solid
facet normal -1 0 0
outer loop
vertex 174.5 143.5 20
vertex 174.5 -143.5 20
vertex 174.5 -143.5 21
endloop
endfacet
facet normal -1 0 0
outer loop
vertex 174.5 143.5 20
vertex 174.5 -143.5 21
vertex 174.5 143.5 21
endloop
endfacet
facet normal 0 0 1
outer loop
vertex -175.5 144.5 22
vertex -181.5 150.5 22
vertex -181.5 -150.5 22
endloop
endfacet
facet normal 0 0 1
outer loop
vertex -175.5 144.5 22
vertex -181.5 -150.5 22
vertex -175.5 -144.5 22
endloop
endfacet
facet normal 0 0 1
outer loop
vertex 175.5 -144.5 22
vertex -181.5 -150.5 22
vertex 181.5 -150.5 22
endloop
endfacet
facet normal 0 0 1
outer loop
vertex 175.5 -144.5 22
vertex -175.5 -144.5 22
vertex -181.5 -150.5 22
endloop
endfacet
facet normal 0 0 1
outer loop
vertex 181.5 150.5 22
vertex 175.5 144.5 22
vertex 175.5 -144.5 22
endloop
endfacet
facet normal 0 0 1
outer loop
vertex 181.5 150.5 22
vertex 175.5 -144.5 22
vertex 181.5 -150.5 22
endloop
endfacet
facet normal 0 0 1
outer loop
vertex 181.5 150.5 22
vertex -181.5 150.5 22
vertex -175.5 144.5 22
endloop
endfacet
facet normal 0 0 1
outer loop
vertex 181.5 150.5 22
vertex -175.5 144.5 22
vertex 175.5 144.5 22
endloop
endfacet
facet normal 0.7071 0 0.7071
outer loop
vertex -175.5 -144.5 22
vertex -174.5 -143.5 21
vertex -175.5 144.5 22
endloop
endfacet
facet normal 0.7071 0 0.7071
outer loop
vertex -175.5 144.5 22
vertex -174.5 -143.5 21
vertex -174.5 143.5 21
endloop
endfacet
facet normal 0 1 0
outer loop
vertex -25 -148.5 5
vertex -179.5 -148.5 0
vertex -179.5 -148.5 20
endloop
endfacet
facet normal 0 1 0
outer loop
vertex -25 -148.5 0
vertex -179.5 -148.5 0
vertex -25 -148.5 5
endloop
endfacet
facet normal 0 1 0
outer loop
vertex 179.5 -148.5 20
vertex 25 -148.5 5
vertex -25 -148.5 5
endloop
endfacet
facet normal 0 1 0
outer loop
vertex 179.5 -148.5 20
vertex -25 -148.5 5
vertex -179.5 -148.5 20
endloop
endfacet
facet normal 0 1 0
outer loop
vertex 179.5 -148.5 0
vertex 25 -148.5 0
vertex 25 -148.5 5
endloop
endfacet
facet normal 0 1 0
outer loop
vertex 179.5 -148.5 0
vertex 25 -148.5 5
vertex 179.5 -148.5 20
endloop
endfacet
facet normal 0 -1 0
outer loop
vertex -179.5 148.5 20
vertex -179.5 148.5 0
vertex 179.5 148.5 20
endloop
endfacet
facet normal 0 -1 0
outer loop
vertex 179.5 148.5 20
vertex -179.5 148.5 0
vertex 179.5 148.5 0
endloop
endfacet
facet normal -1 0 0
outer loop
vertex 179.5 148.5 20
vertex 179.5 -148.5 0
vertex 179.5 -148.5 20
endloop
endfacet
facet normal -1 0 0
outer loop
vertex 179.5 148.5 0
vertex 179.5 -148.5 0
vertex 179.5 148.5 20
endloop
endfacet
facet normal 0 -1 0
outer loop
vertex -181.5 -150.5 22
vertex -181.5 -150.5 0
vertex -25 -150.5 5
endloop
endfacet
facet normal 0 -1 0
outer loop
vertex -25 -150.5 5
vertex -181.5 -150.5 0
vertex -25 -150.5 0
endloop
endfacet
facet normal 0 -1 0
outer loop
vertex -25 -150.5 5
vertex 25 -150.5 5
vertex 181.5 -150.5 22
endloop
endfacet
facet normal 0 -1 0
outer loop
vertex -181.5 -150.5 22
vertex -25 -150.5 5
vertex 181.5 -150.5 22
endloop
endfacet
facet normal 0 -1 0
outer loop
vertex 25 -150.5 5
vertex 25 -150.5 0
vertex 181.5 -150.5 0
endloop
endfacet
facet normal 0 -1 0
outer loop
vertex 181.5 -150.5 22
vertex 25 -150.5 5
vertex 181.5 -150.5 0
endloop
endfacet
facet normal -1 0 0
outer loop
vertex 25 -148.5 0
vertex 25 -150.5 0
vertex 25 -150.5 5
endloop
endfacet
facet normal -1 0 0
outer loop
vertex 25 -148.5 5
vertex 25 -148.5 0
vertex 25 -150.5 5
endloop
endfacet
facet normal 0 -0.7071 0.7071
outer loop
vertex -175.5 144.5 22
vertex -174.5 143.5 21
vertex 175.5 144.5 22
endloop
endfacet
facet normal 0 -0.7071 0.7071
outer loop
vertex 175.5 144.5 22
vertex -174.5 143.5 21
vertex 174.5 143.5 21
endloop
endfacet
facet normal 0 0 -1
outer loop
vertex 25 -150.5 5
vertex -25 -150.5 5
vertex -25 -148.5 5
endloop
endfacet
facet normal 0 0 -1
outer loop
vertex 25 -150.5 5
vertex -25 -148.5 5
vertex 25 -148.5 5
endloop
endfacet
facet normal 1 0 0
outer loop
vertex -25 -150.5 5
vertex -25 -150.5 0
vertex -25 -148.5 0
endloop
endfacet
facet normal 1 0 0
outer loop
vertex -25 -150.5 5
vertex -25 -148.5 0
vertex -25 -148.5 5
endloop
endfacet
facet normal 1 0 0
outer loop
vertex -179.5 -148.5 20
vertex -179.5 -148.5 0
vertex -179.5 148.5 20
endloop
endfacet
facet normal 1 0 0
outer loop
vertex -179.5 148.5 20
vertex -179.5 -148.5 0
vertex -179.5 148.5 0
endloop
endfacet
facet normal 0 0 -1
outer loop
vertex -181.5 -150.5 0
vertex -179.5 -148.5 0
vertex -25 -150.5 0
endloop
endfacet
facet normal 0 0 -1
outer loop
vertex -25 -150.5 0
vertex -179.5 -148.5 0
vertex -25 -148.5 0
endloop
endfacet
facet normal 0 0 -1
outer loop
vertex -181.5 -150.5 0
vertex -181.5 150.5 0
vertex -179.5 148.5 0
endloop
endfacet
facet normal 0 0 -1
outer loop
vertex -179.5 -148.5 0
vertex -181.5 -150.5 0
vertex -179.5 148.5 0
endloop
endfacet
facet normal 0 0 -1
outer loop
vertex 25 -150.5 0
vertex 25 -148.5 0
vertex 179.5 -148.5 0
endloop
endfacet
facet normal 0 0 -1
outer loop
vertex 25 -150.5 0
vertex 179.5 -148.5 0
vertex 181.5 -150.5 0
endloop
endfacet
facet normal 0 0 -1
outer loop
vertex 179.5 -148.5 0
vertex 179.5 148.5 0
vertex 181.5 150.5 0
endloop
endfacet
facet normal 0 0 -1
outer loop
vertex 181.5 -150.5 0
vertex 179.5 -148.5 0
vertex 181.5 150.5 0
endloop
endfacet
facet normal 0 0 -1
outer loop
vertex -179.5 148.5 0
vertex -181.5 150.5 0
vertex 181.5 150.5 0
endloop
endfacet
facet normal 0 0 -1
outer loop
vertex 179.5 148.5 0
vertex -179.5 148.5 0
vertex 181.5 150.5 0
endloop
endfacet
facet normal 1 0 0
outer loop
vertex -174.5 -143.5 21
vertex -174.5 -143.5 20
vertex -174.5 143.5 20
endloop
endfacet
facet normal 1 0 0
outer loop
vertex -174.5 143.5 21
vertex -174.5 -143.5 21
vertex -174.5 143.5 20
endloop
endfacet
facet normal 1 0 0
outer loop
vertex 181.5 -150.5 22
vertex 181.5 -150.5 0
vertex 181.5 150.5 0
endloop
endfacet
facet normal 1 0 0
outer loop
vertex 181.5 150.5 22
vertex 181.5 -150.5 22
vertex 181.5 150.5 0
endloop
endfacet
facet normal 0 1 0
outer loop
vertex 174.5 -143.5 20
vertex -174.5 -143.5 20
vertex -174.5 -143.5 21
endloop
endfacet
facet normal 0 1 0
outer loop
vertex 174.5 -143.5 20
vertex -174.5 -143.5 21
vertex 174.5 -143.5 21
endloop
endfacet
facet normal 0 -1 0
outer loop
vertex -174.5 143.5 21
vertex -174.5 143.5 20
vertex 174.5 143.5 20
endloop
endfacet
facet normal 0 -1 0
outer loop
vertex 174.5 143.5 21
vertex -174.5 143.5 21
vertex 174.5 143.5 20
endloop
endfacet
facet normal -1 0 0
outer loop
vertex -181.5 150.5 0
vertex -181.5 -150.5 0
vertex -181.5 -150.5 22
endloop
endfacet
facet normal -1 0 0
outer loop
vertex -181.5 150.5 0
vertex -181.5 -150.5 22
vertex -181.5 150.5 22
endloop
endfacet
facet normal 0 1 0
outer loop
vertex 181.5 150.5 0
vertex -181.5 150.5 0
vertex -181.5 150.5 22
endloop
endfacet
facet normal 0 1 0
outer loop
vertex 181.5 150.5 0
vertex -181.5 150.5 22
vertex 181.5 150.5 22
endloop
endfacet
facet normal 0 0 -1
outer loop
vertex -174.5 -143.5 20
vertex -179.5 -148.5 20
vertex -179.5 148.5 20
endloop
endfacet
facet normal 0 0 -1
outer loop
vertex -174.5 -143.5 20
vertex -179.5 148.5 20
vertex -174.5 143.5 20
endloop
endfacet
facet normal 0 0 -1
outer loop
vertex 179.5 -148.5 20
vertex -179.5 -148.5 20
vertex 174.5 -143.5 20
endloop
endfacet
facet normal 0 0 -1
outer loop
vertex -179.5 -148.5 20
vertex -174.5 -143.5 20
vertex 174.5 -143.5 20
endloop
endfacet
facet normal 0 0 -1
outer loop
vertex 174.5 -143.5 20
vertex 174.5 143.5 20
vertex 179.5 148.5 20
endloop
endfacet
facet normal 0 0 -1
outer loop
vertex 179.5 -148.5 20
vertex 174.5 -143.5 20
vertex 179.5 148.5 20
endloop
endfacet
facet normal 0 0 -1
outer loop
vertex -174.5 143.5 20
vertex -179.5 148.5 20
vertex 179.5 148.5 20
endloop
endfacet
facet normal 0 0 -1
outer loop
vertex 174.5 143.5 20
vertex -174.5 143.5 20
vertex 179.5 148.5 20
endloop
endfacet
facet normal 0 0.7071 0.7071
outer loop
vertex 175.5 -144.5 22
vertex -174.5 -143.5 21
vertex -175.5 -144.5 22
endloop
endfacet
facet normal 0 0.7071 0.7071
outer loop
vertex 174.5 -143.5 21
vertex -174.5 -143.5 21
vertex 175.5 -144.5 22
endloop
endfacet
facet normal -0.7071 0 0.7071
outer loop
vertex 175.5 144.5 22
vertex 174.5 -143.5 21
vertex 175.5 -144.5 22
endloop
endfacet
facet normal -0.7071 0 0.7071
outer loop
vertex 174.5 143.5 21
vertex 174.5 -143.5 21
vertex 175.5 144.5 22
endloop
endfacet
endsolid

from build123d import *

# Parameters (mm, degrees)
F0_W     = 363
F0_H     = 301
F0_W_2   = 359
F0_H_2   = 297
F0_W_3   = 349
F0_H_3   = 287
F1_DEPTH = 22
F2_DEPTH = 25
F3_DEPTH = 20
F4_SIZE  = 1
F5_W     = 50
F5_H     = 5
F6_DEPTH = 25


with BuildPart() as f1:
    # F0 (on Top) → F1 (new body)
    with BuildSketch(Plane.XY):
        Rectangle(F0_W, F0_H)
        Rectangle(F0_W_2, F0_H_2, mode=Mode.SUBTRACT)
        Rectangle(F0_W_3, F0_H_3)
        Rectangle(F0_W_2, F0_H_2)
        Rectangle(F0_W_3, F0_H_3, mode=Mode.SUBTRACT)
    extrude(amount=F1_DEPTH)

    # F0 (on Top) → F2 (cut)
    with BuildSketch(Plane.XY):
        Rectangle(F0_W_3, F0_H_3)
    extrude(amount=F2_DEPTH, mode=Mode.SUBTRACT)

    # F0 (on Top) → F3 (cut)
    with BuildSketch(Plane.XY):
        Rectangle(F0_W_2, F0_H_2)
        Rectangle(F0_W_3, F0_H_3, mode=Mode.SUBTRACT)
    extrude(amount=F3_DEPTH, mode=Mode.SUBTRACT)

    # F4
    f4_edges = [f1.edges().sort_by_distance(p)[0] for p in [
        (0, -143.5, 22),
        (-174.5, 0, 22),
        (0, 143.5, 22),
        (174.5, 0, 22),
    ]]
    chamfer(f4_edges, length=F4_SIZE)

    # F5 (on face) → F6 (cut)
    with BuildSketch(Plane.XZ.offset(150.5)):
        with Locations((0, 2.5)):
            Rectangle(F5_W, F5_H)
    extrude(amount=-F6_DEPTH, mode=Mode.SUBTRACT)


solid = f1.part
